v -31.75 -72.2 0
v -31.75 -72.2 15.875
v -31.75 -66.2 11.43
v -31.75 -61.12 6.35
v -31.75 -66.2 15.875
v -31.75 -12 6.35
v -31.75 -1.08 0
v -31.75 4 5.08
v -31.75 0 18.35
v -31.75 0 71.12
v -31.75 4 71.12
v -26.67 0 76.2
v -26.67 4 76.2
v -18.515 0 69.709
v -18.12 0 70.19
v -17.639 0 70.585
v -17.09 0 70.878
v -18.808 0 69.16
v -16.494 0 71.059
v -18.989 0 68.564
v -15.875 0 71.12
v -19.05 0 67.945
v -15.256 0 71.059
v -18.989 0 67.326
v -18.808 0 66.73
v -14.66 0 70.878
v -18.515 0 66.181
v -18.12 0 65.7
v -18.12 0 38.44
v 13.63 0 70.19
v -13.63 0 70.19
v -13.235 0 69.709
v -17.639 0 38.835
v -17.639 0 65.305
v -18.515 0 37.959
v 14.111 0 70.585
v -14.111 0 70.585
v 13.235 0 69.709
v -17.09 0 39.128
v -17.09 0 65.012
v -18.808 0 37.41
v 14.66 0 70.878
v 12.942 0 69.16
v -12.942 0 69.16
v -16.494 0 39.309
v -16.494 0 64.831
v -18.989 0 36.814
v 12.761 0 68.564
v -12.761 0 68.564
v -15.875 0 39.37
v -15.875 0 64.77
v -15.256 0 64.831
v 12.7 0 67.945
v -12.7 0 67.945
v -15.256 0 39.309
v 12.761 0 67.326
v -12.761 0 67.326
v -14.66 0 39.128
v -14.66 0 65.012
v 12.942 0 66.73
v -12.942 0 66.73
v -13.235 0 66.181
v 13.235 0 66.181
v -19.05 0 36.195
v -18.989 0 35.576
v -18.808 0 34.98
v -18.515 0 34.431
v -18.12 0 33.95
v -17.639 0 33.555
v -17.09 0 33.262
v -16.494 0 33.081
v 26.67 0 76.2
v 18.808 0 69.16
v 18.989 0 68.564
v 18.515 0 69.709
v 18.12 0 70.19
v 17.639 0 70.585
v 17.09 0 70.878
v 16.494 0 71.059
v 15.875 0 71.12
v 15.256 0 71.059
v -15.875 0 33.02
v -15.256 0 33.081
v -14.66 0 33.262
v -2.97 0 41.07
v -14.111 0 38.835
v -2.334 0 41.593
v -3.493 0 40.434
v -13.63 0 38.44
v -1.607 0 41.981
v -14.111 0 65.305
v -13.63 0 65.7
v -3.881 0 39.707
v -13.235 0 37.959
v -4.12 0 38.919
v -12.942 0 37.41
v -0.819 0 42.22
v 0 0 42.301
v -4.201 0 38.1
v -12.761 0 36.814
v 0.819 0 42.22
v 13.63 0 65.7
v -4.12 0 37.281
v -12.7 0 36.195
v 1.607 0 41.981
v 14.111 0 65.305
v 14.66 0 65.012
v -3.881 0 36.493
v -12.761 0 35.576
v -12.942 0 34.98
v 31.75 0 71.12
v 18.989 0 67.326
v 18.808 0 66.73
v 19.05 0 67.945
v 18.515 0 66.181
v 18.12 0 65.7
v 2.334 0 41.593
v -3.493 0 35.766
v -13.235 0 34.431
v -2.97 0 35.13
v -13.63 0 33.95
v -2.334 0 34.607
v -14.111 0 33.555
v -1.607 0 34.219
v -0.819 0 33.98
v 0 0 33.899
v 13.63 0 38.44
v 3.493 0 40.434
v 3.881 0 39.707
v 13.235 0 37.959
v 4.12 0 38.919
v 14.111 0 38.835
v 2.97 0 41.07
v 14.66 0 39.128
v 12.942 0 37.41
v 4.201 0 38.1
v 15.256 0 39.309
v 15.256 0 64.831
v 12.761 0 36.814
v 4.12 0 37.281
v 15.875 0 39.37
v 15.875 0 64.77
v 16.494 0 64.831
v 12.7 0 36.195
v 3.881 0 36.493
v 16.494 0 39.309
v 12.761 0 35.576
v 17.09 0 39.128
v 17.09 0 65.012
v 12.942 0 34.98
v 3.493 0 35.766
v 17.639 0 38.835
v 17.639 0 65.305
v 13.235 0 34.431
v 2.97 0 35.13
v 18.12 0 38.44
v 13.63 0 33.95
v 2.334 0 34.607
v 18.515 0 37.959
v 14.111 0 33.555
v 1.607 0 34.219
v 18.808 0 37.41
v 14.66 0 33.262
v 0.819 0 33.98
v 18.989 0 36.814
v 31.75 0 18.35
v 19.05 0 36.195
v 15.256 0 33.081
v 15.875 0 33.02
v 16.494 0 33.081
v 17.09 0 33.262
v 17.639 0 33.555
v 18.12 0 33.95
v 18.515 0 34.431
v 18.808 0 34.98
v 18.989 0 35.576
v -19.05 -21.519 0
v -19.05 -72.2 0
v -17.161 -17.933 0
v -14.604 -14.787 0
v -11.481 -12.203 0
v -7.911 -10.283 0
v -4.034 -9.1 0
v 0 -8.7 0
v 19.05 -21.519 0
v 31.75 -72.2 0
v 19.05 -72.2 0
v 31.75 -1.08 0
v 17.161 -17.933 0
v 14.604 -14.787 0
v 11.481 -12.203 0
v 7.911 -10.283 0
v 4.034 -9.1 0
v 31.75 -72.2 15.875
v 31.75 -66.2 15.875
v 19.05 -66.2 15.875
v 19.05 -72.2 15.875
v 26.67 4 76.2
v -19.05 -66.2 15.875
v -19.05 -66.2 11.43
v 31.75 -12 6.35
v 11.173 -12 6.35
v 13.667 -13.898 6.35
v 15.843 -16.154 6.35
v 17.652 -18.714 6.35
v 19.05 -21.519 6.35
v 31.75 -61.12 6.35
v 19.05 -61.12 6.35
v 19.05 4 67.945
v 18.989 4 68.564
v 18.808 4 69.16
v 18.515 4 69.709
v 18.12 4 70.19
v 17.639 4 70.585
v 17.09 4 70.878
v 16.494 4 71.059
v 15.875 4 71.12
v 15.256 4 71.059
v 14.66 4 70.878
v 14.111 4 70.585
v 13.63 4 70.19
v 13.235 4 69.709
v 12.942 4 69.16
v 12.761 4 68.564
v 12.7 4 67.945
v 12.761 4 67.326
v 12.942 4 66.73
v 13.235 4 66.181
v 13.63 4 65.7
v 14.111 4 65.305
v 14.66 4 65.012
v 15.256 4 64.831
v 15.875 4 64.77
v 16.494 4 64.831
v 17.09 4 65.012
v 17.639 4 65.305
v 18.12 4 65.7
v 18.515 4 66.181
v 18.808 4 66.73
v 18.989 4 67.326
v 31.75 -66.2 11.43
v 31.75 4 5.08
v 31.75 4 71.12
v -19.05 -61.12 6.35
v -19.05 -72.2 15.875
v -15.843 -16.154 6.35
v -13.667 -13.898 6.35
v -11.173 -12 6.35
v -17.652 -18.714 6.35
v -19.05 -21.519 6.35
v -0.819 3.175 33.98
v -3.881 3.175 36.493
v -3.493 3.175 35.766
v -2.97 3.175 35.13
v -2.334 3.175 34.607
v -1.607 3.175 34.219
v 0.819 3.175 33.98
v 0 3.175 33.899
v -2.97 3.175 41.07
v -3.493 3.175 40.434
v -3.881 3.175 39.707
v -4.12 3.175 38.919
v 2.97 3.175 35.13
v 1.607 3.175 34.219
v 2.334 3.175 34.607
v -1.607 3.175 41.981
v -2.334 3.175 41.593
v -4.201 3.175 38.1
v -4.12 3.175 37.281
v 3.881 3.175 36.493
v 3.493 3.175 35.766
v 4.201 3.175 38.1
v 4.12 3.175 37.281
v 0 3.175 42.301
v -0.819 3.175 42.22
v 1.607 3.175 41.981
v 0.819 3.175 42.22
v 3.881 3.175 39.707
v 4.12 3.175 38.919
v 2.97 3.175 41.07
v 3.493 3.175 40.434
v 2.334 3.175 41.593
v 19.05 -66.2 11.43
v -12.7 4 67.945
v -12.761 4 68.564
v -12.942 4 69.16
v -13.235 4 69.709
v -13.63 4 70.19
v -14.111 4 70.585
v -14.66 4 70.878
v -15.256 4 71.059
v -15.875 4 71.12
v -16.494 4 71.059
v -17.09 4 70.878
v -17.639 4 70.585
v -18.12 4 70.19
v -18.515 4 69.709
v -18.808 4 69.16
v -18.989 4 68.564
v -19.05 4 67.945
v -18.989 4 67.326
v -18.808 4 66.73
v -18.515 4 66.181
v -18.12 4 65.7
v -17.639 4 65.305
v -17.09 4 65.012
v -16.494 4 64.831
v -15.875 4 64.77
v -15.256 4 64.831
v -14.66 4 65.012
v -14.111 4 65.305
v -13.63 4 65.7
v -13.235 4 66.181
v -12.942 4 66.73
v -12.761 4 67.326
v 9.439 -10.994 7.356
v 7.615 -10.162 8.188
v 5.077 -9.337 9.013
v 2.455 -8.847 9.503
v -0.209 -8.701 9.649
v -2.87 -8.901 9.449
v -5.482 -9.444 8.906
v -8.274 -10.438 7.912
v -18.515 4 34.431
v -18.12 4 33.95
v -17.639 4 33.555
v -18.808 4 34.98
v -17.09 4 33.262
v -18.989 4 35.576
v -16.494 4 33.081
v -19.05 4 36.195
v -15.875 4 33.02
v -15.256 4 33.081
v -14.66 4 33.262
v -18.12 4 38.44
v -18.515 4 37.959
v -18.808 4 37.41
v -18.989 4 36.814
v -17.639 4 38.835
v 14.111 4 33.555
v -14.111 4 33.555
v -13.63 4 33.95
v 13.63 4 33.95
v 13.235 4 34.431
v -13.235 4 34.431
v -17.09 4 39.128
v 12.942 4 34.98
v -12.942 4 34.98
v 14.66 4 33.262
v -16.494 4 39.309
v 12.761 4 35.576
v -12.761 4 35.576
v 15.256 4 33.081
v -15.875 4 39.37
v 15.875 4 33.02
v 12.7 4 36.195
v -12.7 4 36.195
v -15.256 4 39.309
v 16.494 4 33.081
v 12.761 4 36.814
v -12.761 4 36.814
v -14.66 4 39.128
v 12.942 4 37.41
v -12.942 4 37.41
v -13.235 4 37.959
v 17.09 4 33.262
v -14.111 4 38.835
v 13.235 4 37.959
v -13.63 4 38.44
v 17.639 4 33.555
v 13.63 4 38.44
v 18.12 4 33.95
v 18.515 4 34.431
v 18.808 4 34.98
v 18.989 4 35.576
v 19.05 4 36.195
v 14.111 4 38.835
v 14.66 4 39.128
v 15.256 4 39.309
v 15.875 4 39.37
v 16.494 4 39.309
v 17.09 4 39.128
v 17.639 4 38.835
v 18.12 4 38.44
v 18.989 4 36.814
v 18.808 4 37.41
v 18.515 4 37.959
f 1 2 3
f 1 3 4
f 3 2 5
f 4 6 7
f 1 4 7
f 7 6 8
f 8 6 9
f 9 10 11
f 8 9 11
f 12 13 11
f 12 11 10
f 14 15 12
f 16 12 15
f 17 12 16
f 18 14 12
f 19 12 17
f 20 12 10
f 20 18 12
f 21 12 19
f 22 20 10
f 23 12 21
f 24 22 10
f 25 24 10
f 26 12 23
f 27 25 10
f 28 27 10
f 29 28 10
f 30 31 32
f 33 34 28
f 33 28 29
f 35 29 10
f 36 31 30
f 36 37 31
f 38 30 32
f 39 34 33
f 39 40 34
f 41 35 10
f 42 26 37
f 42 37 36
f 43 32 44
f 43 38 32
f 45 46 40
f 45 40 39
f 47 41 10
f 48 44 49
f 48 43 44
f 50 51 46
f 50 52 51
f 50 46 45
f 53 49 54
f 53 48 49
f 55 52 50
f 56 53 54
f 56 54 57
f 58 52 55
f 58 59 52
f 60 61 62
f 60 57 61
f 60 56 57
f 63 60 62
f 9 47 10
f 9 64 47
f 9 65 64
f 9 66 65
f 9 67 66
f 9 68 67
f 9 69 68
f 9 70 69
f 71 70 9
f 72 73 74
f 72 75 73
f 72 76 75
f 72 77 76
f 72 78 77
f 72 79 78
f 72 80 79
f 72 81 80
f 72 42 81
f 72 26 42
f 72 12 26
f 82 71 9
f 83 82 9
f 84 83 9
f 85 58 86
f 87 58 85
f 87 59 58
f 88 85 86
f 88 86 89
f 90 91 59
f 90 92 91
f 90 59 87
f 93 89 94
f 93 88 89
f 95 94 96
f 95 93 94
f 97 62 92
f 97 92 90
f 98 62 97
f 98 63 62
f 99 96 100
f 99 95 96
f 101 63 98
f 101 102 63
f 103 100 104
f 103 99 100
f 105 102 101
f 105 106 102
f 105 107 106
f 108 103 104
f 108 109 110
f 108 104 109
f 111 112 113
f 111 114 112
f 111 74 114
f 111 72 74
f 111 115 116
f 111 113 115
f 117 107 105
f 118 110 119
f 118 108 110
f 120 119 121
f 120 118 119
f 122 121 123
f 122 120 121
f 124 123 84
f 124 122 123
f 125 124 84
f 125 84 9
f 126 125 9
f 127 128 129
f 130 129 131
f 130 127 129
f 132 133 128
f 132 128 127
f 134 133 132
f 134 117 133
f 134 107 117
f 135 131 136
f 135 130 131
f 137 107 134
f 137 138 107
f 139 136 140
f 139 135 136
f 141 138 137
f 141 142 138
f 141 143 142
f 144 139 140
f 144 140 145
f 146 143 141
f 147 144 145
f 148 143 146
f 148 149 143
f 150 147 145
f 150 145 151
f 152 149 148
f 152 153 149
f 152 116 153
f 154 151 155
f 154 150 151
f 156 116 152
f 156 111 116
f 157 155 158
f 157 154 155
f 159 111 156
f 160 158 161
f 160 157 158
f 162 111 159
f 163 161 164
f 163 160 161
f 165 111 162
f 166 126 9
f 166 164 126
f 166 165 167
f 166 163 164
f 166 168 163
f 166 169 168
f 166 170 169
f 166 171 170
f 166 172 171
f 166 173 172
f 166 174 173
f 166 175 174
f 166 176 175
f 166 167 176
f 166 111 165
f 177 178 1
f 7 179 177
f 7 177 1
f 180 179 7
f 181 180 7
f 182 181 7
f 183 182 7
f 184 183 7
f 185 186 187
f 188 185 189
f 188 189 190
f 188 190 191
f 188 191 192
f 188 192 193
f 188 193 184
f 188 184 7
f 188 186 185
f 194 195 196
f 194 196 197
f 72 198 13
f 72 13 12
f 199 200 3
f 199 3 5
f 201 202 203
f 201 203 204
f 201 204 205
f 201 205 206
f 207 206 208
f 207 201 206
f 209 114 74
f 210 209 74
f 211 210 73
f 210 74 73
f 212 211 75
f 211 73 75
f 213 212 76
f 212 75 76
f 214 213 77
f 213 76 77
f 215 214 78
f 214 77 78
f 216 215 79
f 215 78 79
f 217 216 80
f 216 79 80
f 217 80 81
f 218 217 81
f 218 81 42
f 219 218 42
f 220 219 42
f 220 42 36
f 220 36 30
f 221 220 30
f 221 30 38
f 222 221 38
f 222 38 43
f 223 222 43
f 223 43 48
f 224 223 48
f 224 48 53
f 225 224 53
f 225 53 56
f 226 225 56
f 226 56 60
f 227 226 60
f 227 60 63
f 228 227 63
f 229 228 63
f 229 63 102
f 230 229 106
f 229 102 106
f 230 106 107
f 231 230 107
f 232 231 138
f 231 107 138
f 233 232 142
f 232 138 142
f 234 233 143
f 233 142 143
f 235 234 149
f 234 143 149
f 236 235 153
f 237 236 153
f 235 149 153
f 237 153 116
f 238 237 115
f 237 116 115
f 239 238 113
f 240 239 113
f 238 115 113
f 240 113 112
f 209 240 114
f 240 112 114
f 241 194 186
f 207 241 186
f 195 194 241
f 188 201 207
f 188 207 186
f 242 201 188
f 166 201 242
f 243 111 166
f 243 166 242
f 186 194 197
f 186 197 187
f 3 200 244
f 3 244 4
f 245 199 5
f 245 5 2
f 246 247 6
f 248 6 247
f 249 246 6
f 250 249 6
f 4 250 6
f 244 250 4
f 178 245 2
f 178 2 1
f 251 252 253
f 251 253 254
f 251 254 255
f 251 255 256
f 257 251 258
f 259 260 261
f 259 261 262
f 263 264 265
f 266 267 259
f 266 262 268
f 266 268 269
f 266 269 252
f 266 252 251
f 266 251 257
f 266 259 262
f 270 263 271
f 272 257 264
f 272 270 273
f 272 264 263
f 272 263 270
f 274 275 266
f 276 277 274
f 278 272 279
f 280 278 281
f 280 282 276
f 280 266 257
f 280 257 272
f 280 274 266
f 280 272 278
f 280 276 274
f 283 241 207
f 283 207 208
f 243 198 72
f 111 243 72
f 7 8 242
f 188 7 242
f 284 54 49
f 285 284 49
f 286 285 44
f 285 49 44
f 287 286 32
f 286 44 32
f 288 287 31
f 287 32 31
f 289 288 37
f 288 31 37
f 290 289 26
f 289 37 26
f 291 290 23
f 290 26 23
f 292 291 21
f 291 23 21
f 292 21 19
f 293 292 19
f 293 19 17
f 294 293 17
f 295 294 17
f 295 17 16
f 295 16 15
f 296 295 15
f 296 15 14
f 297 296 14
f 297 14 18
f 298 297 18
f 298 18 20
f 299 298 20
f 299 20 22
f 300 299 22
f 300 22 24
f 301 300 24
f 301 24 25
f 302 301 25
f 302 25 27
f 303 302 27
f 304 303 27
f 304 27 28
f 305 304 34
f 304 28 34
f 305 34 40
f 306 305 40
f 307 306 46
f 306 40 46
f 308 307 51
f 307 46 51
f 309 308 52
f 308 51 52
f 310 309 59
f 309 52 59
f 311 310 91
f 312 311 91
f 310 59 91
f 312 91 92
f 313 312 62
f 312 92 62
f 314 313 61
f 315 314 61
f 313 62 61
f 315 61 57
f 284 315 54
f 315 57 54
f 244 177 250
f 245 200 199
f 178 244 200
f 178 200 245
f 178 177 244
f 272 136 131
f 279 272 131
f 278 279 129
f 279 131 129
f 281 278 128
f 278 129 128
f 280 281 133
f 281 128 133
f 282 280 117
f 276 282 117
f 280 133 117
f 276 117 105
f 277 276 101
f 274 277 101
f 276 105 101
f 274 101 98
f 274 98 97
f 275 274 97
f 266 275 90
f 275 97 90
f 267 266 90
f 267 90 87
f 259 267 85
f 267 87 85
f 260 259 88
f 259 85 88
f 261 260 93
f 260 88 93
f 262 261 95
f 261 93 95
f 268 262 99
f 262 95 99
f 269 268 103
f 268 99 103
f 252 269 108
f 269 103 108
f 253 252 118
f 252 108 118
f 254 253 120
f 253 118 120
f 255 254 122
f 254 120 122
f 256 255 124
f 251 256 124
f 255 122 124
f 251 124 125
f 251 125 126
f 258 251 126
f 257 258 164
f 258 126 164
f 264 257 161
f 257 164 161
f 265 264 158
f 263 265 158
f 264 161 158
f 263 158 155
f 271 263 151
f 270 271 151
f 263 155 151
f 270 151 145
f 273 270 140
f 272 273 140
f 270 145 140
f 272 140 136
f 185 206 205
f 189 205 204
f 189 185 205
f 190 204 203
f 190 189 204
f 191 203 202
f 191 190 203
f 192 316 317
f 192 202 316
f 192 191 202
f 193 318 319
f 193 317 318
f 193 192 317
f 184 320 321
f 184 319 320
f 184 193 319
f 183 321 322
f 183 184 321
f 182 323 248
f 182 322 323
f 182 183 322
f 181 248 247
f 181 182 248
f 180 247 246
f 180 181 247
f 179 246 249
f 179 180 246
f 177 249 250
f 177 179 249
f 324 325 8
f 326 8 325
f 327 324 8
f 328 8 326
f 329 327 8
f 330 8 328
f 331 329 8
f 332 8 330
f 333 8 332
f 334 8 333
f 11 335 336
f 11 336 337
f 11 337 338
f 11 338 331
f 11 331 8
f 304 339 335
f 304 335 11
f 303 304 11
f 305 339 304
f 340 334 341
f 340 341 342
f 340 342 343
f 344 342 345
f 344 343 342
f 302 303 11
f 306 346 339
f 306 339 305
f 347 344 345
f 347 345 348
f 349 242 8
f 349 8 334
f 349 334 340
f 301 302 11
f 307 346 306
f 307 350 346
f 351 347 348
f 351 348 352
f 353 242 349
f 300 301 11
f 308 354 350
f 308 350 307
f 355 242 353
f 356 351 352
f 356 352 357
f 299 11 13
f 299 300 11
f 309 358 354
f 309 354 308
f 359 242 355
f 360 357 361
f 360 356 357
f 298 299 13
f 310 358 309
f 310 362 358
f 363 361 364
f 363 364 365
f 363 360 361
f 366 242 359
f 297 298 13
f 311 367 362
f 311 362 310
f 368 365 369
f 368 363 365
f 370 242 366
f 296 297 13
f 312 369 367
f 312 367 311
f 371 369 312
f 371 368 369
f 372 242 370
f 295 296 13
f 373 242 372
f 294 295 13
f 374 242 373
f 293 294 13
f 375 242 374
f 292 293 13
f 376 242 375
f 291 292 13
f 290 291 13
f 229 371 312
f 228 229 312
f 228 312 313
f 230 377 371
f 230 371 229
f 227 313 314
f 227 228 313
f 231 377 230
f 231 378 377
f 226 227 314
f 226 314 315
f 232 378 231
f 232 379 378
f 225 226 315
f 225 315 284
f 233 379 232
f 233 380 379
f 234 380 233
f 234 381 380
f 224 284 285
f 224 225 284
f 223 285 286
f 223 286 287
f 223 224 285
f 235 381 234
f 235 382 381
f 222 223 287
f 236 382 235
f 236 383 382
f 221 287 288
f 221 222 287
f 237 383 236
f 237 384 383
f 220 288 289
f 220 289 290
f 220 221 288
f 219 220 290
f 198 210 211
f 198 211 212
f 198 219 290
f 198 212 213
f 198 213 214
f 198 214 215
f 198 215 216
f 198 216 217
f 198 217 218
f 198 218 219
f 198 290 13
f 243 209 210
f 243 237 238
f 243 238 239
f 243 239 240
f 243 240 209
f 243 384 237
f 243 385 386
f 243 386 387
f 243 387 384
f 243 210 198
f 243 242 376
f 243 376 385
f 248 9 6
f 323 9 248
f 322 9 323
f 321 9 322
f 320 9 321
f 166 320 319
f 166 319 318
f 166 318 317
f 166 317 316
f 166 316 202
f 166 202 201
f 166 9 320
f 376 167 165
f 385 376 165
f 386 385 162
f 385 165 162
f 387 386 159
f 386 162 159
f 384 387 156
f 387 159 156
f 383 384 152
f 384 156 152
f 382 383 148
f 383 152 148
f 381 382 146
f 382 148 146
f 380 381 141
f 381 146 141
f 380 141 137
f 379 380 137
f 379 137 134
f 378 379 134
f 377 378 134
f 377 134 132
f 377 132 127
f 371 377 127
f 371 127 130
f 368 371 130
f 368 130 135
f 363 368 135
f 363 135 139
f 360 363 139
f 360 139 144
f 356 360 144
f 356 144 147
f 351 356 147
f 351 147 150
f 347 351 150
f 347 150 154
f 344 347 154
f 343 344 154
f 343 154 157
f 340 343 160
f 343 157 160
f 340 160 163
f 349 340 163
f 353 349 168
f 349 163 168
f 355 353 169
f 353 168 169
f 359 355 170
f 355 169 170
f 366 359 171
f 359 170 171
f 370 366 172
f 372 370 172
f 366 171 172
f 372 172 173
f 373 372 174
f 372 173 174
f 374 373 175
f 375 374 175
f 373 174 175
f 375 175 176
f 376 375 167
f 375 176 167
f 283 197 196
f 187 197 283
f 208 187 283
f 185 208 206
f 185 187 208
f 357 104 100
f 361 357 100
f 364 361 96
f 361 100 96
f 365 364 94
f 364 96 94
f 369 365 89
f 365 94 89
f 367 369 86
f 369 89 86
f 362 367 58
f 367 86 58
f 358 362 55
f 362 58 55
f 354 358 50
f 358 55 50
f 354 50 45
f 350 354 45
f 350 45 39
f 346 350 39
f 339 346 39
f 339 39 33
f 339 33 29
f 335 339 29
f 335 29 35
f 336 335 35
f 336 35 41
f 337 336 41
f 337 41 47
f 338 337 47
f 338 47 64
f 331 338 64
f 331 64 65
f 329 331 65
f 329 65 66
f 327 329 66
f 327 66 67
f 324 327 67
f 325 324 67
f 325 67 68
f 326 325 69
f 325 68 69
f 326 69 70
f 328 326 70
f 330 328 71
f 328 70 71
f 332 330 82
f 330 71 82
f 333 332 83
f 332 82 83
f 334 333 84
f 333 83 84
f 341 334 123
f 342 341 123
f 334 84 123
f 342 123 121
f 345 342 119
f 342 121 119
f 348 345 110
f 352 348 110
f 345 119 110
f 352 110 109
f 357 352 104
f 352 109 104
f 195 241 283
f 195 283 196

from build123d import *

# Parameters (mm, degrees)
F1_DEPTH = 31.75
F2_SIZE  = 12
F4_DEPTH = 25.4
F5_R     = 3.175
F6_DEPTH = 25.4
F7_SIZE  = 5.08
F8_R     = 4.200525
F9_DEPTH = 3.175
F10_SIZE = 5.08


with BuildPart() as f1:
    # F0 (on Right) → F1 (new body, symmetric)
    with BuildSketch(Plane.YZ):
        Polygon((-72.2, 15.875), (-72.2, 0), (4, 0), (4, 76.2), (0, 76.2), (0, 6.35), (-66.2, 6.35), (-66.2, 15.875), align=None)
    extrude(amount=F1_DEPTH, both=True)

    # F2
    f2_edges = [f1.edges().sort_by_distance(p)[0] for p in [
        (0, 0, 6.35),
    ]]
    chamfer(f2_edges, length=F2_SIZE)

    # F3 (on Top) → F4 (cut)
    with BuildSketch(Plane.XY):
        with BuildLine():
            Line((-19.05, -21.518925), (-19.05, -72.2))
            Line((-19.05, -72.2), (19.05, -72.2))
            Line((19.05, -72.2), (19.05, -21.518925))
            ThreePointArc((19.05, -21.518925), (0, -8.7), (-19.05, -21.518925))
        make_face()
    extrude(amount=F4_DEPTH, mode=Mode.SUBTRACT)

    # F5 (on face) → F6 (cut)
    with BuildSketch(Plane.XZ):
        with Locations((-15.875, 67.945)):
            Circle(F5_R)
        with Locations((15.875, 67.945)):
            Circle(F5_R)
        with Locations((-15.875, 36.195)):
            Circle(F5_R)
        with Locations((15.875, 36.195)):
            Circle(F5_R)
    extrude(amount=-F6_DEPTH, mode=Mode.SUBTRACT)

    # F7
    f7_edges = [f1.edges().sort_by_distance(p)[0] for p in [
        (-25.4, -66.2, 6.35),
        (25.4, -66.2, 6.35),
    ]]
    chamfer(f7_edges, length=F7_SIZE)

    # F8 (on face) → F9 (cut)
    with BuildSketch(Plane.XZ):
        with Locations((0, 38.1)):
            Circle(F8_R)
    extrude(amount=-F9_DEPTH, mode=Mode.SUBTRACT)

    # F10
    f10_edges = [f1.edges().sort_by_distance(p)[0] for p in [
        (31.75, 2, 76.2),
        (-31.75, 2, 76.2),
        (0, 4, 0),
    ]]
    chamfer(f10_edges, length=F10_SIZE)


solid = f1.part
